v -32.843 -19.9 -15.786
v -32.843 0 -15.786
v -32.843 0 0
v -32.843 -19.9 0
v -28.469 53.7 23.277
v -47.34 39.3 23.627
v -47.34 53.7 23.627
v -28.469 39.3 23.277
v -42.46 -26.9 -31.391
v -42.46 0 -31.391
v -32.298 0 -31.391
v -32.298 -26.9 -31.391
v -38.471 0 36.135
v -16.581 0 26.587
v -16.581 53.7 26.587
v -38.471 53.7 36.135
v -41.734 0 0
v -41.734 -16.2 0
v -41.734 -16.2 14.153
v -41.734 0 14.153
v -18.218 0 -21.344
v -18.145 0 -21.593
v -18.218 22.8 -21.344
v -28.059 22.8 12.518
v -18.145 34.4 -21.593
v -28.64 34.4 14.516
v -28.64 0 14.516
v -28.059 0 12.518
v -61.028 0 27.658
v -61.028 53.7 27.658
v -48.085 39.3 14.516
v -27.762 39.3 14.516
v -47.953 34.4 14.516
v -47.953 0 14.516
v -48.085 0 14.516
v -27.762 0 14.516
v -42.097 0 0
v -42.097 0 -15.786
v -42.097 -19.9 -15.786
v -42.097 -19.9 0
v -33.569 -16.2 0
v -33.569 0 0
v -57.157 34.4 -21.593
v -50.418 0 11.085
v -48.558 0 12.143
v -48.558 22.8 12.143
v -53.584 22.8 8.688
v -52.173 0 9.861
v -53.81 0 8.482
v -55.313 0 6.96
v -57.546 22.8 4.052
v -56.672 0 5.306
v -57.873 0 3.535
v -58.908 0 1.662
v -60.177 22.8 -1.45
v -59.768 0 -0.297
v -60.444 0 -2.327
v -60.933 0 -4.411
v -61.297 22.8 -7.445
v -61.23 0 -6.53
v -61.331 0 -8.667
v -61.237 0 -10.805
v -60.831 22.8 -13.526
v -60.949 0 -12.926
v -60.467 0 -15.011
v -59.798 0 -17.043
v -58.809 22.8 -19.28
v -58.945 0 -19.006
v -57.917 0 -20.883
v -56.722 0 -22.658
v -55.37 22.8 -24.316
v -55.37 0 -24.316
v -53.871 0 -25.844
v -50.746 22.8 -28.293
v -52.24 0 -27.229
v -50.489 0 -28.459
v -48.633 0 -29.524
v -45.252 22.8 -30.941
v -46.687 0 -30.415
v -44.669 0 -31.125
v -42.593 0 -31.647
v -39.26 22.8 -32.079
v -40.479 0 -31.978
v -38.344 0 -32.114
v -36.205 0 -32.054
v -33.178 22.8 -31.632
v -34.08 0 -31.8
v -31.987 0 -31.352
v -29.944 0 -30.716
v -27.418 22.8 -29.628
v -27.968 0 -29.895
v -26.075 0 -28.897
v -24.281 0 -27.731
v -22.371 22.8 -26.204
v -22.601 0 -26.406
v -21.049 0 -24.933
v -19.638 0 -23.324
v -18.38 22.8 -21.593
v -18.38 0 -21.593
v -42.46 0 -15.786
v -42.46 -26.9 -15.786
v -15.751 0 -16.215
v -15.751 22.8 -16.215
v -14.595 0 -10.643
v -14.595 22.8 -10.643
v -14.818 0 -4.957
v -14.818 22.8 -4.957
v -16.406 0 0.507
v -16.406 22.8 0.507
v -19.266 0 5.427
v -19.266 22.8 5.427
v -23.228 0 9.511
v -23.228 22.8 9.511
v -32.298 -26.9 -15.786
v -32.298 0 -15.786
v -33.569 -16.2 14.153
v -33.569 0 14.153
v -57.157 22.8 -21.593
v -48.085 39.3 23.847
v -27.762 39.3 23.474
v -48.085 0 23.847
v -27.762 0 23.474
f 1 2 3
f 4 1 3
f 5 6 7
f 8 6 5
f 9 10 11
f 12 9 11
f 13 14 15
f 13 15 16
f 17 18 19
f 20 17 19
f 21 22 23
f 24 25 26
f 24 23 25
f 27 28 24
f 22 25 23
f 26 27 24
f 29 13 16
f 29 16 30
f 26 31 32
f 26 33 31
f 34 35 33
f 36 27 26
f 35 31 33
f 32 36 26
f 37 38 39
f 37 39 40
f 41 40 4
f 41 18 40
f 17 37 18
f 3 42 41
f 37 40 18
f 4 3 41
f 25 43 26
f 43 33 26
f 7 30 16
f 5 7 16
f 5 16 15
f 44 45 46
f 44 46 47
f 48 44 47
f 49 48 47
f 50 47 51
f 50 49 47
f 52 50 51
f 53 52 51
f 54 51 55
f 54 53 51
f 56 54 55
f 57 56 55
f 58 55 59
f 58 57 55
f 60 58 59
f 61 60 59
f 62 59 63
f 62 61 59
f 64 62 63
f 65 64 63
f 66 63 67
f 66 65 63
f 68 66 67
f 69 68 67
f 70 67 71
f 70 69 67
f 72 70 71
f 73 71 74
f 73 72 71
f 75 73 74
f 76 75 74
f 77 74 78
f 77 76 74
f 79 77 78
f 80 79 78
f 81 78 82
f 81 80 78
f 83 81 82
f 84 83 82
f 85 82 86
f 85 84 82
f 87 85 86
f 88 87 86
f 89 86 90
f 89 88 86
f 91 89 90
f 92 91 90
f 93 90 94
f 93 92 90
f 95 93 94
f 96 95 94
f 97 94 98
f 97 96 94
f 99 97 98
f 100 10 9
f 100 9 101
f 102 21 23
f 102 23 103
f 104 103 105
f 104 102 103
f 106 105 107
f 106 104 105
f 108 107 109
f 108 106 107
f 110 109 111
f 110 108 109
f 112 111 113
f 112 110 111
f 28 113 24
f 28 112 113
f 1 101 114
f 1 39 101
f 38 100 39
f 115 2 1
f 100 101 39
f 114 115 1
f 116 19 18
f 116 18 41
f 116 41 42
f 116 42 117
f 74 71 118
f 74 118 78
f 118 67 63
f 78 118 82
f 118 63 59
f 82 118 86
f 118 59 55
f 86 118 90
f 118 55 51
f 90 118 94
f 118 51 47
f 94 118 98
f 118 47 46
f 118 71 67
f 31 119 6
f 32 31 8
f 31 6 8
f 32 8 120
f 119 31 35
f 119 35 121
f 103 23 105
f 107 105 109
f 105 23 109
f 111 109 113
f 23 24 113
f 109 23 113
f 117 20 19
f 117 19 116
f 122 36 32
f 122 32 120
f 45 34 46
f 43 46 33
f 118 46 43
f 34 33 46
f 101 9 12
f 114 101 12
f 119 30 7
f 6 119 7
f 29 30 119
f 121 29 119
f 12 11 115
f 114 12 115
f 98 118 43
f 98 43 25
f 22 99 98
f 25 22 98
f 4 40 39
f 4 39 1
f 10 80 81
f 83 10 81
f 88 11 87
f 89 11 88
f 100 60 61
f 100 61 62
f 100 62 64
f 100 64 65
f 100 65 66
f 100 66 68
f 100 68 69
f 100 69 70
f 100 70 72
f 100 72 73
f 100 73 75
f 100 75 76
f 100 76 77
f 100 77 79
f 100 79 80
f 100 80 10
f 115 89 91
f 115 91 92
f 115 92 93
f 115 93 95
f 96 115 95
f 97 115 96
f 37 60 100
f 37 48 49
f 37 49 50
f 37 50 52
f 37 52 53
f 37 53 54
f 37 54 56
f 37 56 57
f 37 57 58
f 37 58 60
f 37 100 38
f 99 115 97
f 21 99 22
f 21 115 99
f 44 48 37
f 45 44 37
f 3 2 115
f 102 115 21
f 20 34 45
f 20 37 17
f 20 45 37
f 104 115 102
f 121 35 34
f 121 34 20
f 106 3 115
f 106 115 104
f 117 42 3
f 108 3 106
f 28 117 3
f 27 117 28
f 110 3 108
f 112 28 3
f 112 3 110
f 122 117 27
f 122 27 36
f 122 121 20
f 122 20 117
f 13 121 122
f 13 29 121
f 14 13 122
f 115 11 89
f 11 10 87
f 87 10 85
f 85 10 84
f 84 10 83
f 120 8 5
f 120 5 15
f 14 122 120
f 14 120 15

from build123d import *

# Parameters (mm, degrees)
F0_W      = 10.161292
F0_H      = 15.604837
F1_DEPTH  = 26.9
F2_W      = 9.254035
F2_H      = 16.512098
F3_DEPTH  = 19.9
F4_W      = 8.165322
F4_H      = 14.153226
F5_DEPTH  = 16.2
F6_R      = 23.407961
F7_DEPTH  = 22.8
F8_W      = 20.322582
F8_H      = 10.342741
F9_DEPTH  = 39.3
F11_DEPTH = 53.7
F13_DEPTH = 34.4


with BuildPart() as f1:
    # F0 (on Front) → F1 (new body)
    with BuildSketch(Plane.XZ):
        with Locations((-37.379036, -23.58871)):
            Rectangle(F0_W, F0_H)
    extrude(amount=F1_DEPTH)

    # F2 (on Front) → F3 (join)
    with BuildSketch(Plane.XZ):
        with Locations((-37.469761, -8.256049)):
            Rectangle(F2_W, F2_H)
    extrude(amount=F3_DEPTH)

    # F4 (on Front) → F5 (join)
    with BuildSketch(Plane.XZ):
        with Locations((-37.651211, 7.076613)):
            Rectangle(F4_W, F4_H)
    extrude(amount=F5_DEPTH)

    # F6 (on Front) → F7 (join)
    with BuildSketch(Plane.XZ):
        with Locations((-37.923388, -8.709677)):
            Circle(F6_R)
    extrude(amount=-F7_DEPTH)

    # F8 (on Front) → F9 (join)
    with BuildSketch(Plane.XZ):
        with Locations((-37.923389, 19.6875)):
            Rectangle(F8_W, F8_H)
    extrude(amount=-F9_DEPTH)

    # F10 (on Front) → F11 (join)
    with BuildSketch(Plane.XZ):
        Polygon((-61.027735, 27.658321), (-47.339678, 23.627182), (-28.46946, 23.277419), (-16.580516, 26.587443), (-38.470574, 36.135394), align=None)
    extrude(amount=-F11_DEPTH)

    # F12 (on Front) → F13 (join)
    with BuildSketch(Plane.XZ):
        Polygon((-18.145161, -21.592744), (-28.850807, 15.241936), (-47.721777, 15.423387), (-57.157259, -21.592744), align=None)
    extrude(amount=-F13_DEPTH)


solid = f1.part
